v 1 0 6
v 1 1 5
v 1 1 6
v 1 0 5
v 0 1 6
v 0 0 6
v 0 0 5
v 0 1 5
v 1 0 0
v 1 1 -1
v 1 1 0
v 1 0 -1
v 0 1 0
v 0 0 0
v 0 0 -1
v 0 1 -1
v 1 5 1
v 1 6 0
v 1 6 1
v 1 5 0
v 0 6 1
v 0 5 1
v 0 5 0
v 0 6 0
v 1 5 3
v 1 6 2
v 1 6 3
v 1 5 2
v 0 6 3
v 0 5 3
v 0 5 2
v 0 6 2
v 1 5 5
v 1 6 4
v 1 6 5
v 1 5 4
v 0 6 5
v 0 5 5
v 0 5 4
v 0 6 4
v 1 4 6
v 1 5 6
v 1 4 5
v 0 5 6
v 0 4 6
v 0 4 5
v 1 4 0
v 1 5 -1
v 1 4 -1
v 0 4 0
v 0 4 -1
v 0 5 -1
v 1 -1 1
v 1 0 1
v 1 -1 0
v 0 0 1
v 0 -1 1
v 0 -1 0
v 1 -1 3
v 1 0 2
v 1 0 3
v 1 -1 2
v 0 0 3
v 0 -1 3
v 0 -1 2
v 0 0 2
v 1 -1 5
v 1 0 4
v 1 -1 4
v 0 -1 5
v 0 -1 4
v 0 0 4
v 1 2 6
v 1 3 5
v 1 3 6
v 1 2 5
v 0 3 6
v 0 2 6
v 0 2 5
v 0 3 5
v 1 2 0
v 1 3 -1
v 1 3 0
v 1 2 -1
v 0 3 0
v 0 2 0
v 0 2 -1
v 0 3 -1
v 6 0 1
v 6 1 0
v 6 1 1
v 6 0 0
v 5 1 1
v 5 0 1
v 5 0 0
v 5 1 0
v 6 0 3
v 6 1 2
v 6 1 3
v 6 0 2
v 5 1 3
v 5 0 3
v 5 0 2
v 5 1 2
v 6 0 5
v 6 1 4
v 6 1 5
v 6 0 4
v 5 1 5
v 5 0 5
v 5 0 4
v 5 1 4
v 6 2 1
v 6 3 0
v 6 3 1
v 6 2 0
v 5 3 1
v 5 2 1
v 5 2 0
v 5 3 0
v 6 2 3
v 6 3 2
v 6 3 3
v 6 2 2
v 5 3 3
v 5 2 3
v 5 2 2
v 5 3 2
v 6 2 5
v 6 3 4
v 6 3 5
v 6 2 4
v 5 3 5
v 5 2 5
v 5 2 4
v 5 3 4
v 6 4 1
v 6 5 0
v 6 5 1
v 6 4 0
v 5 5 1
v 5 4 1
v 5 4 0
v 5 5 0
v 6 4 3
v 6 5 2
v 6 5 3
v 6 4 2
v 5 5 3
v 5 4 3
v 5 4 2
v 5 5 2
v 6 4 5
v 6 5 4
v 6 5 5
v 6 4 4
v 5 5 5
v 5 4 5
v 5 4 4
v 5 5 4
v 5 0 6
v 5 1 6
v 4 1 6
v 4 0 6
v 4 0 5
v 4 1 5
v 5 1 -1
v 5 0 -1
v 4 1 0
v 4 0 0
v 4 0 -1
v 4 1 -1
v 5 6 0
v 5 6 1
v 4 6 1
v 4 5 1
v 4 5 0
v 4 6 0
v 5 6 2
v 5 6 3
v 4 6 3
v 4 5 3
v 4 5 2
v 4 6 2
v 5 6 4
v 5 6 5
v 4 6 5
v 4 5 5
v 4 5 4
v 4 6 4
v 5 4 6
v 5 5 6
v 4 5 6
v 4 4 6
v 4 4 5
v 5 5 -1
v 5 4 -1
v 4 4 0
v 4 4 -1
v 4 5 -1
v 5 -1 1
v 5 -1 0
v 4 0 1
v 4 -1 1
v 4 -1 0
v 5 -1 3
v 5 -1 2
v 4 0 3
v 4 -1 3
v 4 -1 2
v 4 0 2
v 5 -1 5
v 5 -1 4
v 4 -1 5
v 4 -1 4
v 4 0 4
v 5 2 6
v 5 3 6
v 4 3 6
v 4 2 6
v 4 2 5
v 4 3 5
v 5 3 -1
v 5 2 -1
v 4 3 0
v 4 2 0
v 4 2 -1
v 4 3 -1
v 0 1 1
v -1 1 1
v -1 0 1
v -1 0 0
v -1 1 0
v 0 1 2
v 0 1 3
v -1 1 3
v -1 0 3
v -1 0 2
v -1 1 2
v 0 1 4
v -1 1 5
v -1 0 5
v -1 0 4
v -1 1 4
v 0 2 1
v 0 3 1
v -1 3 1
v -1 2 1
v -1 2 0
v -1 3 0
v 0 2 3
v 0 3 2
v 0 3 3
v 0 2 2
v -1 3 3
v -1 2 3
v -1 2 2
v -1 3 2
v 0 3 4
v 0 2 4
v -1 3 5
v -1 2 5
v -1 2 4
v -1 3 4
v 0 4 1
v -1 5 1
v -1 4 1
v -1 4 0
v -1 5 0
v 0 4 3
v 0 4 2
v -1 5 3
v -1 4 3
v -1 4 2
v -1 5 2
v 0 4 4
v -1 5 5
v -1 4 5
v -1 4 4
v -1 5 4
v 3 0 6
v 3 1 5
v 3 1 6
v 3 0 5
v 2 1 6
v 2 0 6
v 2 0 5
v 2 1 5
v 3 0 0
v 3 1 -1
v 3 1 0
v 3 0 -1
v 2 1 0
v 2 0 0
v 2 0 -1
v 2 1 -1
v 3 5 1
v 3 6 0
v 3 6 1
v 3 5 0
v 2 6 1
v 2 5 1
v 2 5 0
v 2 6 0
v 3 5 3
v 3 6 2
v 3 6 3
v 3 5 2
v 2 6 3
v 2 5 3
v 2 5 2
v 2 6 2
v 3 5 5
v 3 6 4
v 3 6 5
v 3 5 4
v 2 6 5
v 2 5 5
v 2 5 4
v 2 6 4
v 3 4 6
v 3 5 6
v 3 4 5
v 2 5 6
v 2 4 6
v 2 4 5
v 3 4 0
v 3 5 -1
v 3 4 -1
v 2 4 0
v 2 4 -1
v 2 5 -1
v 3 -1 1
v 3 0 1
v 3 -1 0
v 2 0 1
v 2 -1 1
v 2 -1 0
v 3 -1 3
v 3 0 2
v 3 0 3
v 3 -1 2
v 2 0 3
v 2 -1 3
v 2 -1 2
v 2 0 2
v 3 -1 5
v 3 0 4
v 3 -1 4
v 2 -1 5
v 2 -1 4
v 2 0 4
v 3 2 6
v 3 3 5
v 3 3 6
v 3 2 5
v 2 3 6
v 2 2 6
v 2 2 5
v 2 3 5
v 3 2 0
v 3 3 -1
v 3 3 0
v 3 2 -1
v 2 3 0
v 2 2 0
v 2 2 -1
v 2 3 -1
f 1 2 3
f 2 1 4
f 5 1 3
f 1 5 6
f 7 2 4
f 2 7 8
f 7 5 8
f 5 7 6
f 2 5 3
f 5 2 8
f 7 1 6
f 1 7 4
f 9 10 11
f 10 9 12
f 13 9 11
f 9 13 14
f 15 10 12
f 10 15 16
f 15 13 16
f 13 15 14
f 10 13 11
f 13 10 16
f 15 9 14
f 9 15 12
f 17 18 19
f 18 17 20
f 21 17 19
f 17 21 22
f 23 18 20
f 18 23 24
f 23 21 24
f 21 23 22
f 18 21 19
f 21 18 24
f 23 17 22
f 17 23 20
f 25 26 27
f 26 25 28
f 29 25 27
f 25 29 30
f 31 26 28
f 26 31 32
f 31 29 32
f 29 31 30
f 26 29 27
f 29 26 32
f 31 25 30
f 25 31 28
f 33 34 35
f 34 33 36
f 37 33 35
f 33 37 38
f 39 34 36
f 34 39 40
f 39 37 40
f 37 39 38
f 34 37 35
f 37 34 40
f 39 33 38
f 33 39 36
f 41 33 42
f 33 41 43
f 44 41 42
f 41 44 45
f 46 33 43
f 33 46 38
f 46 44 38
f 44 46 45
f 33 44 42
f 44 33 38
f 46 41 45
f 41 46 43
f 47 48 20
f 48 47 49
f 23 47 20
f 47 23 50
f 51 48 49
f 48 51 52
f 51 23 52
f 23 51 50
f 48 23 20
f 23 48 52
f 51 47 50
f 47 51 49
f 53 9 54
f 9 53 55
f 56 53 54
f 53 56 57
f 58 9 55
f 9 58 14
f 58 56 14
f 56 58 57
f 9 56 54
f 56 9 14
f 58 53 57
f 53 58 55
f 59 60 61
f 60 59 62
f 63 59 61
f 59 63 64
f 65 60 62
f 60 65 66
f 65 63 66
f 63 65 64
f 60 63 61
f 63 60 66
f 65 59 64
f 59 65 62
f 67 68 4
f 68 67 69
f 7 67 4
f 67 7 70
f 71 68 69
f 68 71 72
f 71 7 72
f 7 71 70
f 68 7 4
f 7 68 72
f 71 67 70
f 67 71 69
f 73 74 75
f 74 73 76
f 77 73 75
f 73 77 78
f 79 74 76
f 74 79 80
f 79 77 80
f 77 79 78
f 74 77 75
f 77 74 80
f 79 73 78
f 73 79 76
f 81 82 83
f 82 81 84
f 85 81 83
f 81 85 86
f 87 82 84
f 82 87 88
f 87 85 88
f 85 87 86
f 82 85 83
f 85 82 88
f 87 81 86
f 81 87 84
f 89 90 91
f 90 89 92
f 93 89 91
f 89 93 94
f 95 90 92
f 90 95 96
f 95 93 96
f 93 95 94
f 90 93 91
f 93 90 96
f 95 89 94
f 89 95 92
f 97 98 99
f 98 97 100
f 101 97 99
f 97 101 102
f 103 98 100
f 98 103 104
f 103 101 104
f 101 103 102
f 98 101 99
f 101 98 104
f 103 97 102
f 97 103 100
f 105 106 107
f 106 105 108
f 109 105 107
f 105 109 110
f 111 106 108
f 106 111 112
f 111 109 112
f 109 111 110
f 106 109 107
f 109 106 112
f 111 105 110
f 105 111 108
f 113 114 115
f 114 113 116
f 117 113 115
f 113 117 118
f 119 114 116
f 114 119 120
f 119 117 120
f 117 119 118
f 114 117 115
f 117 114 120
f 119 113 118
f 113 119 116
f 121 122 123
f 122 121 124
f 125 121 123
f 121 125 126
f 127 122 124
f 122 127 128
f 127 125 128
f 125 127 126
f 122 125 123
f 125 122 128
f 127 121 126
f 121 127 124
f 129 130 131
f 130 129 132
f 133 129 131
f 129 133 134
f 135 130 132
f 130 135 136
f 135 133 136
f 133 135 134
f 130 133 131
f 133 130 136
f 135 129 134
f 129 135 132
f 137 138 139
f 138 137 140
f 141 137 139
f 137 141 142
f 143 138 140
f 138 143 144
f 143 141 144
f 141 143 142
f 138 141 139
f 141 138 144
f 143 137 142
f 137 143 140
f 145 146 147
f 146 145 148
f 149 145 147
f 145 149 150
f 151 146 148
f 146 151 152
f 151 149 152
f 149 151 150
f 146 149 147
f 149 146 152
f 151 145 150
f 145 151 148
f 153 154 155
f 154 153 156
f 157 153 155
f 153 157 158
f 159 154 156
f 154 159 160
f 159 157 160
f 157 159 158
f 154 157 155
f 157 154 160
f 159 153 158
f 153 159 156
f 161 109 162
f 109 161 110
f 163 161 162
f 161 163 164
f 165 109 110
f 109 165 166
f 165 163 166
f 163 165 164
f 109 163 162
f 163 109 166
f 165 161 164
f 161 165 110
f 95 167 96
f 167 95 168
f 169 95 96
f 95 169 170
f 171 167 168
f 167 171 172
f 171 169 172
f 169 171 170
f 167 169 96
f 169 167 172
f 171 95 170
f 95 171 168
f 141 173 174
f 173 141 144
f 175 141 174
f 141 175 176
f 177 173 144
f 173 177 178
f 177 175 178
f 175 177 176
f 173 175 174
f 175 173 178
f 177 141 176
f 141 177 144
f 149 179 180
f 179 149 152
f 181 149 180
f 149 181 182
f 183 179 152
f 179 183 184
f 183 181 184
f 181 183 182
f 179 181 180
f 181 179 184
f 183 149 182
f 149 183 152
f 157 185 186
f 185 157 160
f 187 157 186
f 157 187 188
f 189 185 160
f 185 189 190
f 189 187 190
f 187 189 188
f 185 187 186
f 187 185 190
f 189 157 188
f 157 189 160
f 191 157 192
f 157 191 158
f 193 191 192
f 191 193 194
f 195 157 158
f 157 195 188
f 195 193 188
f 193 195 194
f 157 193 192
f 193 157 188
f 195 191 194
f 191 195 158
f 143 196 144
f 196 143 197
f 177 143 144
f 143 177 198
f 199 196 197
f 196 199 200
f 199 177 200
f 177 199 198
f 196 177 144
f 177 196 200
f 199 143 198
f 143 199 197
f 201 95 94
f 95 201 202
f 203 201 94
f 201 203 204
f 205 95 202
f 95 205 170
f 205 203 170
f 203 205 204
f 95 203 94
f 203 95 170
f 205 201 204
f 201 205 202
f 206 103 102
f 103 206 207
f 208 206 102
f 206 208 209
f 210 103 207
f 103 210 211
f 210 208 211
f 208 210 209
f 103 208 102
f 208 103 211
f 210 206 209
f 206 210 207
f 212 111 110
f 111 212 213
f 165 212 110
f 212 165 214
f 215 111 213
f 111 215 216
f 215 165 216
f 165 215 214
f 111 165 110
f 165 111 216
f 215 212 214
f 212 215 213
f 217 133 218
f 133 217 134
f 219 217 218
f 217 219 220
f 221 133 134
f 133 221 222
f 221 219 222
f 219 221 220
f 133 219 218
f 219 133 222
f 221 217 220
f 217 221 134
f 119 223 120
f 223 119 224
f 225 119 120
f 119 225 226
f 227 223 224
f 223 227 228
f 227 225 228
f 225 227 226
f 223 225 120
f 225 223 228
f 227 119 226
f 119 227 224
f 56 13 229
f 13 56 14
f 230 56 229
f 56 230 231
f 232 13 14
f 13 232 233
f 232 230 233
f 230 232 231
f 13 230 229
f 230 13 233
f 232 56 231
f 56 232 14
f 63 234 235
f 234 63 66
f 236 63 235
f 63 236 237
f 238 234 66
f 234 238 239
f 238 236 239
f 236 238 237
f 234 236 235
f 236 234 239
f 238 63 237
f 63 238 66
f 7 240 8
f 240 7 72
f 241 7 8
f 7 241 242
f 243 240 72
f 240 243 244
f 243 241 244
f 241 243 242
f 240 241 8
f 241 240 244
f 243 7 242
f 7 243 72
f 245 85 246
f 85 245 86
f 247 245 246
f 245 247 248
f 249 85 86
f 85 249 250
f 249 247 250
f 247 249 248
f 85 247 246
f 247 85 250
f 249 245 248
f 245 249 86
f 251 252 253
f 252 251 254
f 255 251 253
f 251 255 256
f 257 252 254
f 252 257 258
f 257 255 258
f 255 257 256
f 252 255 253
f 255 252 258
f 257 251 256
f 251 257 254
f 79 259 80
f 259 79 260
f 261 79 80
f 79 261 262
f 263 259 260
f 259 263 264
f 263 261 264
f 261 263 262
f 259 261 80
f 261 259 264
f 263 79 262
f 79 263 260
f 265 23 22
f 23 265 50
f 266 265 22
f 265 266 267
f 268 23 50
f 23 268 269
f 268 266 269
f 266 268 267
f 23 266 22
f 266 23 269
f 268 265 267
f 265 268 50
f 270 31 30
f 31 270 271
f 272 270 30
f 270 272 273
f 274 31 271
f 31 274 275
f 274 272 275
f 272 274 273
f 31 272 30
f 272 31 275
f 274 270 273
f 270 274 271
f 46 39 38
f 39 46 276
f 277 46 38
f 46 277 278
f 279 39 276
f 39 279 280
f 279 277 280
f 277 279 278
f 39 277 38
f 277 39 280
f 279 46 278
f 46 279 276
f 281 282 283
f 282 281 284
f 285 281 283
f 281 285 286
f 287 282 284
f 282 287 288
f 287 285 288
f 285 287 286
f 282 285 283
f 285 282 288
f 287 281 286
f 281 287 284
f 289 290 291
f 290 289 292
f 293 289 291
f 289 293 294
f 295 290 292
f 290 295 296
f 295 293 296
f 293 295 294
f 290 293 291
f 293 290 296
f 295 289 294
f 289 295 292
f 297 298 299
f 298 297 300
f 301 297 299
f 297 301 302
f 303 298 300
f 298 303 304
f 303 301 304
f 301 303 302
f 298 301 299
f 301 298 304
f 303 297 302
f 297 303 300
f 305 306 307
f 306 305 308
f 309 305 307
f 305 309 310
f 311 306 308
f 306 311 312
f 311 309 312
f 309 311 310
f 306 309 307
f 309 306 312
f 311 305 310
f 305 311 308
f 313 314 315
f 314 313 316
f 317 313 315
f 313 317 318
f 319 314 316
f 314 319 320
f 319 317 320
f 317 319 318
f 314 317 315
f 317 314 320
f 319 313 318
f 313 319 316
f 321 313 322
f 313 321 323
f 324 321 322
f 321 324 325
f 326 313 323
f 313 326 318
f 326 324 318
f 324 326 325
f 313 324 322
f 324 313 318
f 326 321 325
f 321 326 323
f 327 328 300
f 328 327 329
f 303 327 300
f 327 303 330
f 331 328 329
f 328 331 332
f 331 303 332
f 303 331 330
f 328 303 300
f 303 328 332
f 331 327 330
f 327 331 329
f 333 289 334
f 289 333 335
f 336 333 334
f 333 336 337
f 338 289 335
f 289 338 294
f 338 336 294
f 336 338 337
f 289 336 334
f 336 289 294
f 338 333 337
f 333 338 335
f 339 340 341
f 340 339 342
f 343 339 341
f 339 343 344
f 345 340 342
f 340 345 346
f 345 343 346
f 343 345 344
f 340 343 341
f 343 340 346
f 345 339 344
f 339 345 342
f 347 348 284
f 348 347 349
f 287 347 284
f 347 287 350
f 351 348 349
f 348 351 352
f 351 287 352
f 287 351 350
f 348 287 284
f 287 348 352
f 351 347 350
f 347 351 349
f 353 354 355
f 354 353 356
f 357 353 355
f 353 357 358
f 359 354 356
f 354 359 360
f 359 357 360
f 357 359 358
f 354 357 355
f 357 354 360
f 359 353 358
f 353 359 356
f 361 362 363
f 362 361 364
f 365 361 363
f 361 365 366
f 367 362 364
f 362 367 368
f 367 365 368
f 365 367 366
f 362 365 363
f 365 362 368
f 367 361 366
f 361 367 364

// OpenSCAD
translate([ 0,  0,  5]) cube(1);
translate([ 0,  0, -1]) cube(1);
translate([ 0,  5,  0]) cube(1);
translate([ 0,  5,  2]) cube(1);
translate([ 0,  5,  4]) cube(1);
translate([ 0,  4,  5]) cube(1);
translate([ 0,  4, -1]) cube(1);
translate([ 0, -1,  0]) cube(1);
translate([ 0, -1,  2]) cube(1);
translate([ 0, -1,  4]) cube(1);
translate([ 0,  2,  5]) cube(1);
translate([ 0,  2, -1]) cube(1);
translate([ 5,  0,  0]) cube(1);
translate([ 5,  0,  2]) cube(1);
translate([ 5,  0,  4]) cube(1);
translate([ 5,  2,  0]) cube(1);
translate([ 5,  2,  2]) cube(1);
translate([ 5,  2,  4]) cube(1);
translate([ 5,  4,  0]) cube(1);
translate([ 5,  4,  2]) cube(1);
translate([ 5,  4,  4]) cube(1);
translate([ 4,  0,  5]) cube(1);
translate([ 4,  0, -1]) cube(1);
translate([ 4,  5,  0]) cube(1);
translate([ 4,  5,  2]) cube(1);
translate([ 4,  5,  4]) cube(1);
translate([ 4,  4,  5]) cube(1);
translate([ 4,  4, -1]) cube(1);
translate([ 4, -1,  0]) cube(1);
translate([ 4, -1,  2]) cube(1);
translate([ 4, -1,  4]) cube(1);
translate([ 4,  2,  5]) cube(1);
translate([ 4,  2, -1]) cube(1);
translate([-1,  0,  0]) cube(1);
translate([-1,  0,  2]) cube(1);
translate([-1,  0,  4]) cube(1);
translate([-1,  2,  0]) cube(1);
translate([-1,  2,  2]) cube(1);
translate([-1,  2,  4]) cube(1);
translate([-1,  4,  0]) cube(1);
translate([-1,  4,  2]) cube(1);
translate([-1,  4,  4]) cube(1);
translate([ 2,  0,  5]) cube(1);
translate([ 2,  0, -1]) cube(1);
translate([ 2,  5,  0]) cube(1);
translate([ 2,  5,  2]) cube(1);
translate([ 2,  5,  4]) cube(1);
translate([ 2,  4,  5]) cube(1);
translate([ 2,  4, -1]) cube(1);
translate([ 2, -1,  0]) cube(1);
translate([ 2, -1,  2]) cube(1);
translate([ 2, -1,  4]) cube(1);
translate([ 2,  2,  5]) cube(1);
translate([ 2,  2, -1]) cube(1);
